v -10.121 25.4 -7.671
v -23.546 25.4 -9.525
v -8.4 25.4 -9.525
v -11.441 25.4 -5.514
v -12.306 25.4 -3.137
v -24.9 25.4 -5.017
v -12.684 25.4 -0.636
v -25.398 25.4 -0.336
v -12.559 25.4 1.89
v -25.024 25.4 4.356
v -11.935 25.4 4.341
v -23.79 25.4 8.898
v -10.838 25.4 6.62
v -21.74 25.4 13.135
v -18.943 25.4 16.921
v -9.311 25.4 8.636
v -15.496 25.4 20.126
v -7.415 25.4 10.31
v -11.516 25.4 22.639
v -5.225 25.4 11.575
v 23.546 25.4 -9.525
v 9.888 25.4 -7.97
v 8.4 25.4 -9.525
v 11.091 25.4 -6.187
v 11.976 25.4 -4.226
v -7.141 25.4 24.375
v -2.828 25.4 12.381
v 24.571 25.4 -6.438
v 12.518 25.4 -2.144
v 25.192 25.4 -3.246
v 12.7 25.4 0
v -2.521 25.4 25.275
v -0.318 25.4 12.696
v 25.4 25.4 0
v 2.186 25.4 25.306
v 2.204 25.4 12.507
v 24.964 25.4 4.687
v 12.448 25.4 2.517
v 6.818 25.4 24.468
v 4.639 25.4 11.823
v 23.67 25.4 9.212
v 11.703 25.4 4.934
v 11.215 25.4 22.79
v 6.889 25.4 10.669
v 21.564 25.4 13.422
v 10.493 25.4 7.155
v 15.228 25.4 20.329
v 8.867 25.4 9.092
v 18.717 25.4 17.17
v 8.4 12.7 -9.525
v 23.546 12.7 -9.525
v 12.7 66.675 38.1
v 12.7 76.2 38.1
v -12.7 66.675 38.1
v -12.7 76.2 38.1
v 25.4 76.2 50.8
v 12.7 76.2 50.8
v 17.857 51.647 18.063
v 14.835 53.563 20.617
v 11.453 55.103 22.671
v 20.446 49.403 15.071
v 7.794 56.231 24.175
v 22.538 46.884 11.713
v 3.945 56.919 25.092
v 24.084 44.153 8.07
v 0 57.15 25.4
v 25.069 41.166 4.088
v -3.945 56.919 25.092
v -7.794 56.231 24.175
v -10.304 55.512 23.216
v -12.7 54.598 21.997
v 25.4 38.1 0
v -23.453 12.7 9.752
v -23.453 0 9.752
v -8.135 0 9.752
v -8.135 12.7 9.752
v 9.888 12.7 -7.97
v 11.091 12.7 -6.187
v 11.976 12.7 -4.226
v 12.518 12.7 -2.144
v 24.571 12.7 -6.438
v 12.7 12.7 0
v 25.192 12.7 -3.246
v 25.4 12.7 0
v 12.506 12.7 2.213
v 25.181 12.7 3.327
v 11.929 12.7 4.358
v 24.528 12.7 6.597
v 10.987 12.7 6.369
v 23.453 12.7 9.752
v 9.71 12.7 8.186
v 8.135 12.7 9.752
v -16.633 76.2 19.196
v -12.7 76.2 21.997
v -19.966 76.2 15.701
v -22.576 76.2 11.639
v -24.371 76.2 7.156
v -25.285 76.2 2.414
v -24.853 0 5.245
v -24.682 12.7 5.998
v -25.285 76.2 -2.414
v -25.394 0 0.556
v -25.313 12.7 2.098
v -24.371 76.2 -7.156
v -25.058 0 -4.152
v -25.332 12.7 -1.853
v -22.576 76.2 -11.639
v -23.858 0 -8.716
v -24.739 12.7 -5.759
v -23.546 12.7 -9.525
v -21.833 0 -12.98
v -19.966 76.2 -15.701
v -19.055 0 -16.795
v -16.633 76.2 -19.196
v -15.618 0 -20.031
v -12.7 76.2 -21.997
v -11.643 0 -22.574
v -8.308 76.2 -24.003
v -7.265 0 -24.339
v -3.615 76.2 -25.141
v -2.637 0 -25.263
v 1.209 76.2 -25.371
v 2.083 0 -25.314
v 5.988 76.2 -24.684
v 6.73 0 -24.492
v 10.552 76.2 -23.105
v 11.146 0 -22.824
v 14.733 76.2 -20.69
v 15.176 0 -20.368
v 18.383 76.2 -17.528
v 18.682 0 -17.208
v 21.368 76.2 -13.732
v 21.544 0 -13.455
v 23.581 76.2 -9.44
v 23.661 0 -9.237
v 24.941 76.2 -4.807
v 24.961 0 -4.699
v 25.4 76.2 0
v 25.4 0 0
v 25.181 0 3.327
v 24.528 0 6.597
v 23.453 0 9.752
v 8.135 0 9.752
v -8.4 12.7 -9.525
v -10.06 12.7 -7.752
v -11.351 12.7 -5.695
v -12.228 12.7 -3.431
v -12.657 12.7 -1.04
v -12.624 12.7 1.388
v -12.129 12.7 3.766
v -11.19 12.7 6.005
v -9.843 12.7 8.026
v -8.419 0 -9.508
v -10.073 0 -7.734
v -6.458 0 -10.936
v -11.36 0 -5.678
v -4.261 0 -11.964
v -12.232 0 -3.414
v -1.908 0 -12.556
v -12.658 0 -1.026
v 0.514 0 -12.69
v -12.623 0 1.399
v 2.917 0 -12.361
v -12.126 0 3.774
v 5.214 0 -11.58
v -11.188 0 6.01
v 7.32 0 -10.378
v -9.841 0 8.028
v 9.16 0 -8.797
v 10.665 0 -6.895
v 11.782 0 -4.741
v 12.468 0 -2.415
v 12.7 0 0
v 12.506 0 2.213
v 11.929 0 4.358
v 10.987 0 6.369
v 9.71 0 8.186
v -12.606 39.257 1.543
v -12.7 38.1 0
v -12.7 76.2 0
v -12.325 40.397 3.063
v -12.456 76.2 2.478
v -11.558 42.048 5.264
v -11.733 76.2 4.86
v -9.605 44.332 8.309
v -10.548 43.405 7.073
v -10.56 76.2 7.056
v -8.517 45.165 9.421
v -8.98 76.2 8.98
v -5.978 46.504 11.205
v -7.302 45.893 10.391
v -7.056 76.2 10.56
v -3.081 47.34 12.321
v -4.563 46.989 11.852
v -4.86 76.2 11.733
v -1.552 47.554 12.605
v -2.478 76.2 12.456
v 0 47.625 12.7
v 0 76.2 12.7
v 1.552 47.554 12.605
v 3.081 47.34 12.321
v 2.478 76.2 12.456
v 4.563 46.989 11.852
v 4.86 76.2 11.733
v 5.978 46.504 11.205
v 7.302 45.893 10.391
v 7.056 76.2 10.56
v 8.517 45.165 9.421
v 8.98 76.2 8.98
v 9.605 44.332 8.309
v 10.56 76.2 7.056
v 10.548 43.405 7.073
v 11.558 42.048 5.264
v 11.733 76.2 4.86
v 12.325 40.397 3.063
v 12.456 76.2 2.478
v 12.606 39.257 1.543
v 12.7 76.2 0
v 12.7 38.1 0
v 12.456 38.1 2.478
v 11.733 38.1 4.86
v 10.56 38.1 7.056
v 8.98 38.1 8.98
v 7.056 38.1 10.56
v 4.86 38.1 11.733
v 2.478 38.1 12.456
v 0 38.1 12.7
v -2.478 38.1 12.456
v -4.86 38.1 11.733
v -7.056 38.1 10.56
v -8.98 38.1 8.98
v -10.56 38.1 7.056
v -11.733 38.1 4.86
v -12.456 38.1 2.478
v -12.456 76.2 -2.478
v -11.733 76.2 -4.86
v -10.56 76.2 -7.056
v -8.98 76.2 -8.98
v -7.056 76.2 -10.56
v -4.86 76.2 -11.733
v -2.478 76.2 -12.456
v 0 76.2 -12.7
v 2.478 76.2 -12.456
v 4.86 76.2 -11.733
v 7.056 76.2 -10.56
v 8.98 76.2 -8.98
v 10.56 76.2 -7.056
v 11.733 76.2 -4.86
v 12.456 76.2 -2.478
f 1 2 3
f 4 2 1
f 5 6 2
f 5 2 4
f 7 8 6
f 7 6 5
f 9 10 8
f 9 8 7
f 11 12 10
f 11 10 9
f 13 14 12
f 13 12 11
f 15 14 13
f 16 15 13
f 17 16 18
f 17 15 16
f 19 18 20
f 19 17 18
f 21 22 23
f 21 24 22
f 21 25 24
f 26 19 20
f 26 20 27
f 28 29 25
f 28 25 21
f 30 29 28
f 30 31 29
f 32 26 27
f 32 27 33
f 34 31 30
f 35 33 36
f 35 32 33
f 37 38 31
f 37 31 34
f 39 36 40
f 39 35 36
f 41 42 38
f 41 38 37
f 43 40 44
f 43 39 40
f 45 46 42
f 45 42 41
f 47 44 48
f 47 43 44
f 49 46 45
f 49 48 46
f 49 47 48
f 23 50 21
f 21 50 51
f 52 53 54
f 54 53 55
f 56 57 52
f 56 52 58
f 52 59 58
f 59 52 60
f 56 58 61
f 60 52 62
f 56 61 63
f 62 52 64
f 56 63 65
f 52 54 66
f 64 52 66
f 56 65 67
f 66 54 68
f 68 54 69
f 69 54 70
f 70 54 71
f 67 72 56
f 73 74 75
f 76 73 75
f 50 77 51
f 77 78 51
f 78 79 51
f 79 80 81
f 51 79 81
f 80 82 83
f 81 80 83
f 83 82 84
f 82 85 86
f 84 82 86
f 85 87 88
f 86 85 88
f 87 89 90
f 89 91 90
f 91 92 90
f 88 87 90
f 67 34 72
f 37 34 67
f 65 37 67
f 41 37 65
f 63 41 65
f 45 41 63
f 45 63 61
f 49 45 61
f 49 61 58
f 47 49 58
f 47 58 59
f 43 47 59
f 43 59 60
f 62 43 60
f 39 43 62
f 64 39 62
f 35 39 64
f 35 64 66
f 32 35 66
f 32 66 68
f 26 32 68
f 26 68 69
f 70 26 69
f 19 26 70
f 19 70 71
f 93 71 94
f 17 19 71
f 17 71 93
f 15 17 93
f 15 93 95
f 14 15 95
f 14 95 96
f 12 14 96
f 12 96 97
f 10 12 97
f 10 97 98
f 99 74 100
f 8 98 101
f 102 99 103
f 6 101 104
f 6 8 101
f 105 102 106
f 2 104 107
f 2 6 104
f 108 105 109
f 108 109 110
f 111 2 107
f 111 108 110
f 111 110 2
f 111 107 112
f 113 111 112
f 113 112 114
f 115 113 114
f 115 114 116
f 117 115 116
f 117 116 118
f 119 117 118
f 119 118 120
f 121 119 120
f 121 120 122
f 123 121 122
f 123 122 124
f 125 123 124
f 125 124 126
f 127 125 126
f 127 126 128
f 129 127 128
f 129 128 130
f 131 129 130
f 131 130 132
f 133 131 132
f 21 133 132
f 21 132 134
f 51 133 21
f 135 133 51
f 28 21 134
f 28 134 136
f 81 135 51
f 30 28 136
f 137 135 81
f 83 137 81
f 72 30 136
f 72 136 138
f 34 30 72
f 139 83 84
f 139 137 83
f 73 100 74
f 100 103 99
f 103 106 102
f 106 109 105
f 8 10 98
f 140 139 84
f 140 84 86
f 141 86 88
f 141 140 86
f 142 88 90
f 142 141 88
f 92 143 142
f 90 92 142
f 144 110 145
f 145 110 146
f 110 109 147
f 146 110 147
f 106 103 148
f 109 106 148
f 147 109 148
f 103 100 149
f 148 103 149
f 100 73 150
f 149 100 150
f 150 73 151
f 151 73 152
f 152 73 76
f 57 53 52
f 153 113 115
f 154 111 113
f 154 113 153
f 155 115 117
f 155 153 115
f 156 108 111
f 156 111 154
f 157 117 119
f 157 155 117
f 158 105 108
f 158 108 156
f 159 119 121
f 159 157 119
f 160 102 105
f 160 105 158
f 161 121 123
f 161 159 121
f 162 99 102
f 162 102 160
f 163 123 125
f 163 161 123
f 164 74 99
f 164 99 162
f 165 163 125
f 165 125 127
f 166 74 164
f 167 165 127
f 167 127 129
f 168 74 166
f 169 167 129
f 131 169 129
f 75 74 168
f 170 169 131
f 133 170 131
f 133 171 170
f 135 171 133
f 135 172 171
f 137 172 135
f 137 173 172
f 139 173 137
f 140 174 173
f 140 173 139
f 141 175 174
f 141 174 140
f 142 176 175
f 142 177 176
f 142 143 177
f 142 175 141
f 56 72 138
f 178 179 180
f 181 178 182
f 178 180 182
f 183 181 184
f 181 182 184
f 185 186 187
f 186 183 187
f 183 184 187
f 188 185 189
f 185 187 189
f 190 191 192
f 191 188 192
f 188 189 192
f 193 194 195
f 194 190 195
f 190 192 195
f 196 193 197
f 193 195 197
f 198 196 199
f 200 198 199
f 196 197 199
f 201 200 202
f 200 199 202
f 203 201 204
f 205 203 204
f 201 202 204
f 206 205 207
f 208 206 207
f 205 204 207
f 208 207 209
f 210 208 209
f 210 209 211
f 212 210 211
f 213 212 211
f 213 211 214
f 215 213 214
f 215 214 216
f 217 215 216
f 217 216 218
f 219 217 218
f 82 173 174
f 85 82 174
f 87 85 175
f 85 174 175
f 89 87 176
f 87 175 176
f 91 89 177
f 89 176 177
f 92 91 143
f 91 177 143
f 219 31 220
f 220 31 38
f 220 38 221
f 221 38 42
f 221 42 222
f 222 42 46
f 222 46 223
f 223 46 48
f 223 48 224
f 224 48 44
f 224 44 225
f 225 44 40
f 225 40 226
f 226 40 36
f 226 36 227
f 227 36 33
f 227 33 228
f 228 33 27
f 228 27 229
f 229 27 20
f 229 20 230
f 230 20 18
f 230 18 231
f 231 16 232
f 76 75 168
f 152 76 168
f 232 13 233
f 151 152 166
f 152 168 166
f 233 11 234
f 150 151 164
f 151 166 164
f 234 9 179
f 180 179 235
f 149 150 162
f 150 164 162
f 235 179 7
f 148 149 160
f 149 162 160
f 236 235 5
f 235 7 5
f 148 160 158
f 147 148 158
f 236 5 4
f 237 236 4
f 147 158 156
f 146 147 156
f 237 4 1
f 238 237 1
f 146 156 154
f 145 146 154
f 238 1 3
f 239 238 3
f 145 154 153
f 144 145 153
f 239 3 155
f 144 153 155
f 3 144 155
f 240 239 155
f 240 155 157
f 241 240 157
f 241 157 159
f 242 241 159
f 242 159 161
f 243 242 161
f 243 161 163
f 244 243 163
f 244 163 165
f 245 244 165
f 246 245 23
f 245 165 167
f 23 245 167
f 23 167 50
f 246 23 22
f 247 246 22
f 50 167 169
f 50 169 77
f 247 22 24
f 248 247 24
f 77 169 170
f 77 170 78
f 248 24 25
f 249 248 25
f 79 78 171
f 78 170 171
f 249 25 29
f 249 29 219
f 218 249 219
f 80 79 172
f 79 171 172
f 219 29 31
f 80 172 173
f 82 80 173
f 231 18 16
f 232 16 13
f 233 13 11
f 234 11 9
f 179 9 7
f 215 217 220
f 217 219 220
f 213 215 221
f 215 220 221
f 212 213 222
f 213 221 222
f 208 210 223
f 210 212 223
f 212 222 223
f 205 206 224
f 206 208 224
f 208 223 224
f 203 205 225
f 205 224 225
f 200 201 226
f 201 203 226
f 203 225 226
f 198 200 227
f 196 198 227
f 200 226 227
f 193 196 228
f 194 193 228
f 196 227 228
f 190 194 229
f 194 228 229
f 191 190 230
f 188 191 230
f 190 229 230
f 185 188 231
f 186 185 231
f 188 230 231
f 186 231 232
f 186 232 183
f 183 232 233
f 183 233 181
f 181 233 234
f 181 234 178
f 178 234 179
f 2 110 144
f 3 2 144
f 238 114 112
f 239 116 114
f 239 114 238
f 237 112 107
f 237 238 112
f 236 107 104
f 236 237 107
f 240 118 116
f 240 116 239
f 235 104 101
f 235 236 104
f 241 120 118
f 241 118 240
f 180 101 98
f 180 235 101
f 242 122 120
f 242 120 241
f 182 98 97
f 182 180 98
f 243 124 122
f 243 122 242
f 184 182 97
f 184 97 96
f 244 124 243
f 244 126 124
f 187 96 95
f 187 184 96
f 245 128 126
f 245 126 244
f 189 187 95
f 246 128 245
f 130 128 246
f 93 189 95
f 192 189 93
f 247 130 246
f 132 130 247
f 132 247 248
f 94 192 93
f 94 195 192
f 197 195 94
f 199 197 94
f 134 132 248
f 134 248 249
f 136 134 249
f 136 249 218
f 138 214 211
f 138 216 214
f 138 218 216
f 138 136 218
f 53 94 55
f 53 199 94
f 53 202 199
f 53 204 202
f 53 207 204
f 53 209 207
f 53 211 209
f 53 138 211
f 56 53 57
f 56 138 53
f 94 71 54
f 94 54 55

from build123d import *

# Parameters (mm, degrees)
F0_R          = 25.4
F0_R_2        = 12.7
F1_DEPTH      = 76.2
F3_DEPTH      = 12.7
F5_START      = -12.7
F5_DEPTH      = 12.7
F7_DEPTH      = 25.4
F7_DEPTH_BACK = 12.7
F9_DEPTH      = 38.1
F10_W         = 25.4
F10_H         = 12.7
F11_DEPTH     = 25.4


with BuildPart() as f1:
    # F0 (on Front) → F1 (new body)
    with BuildSketch(Plane.XZ):
        Circle(F0_R)
        Circle(F0_R_2, mode=Mode.SUBTRACT)
    extrude(amount=-F1_DEPTH)

    # F2 (on face) → F3 (cut)
    with BuildSketch(Plane.XZ):
        with BuildLine():
            Line((8.1350766981, 9.7524626181), (23.4531335408, 9.7524626181))
            ThreePointArc((23.4531335408, 9.7524626181), (0, 25.4), (-23.4531335408, 9.7524626181))
            Line((-23.4531335408, 9.7524626181), (-8.1350766981, 9.7524626181))
            ThreePointArc((-8.1350766981, 9.7524626181), (0, 12.7), (8.1350766981, 9.7524626181))
        make_face()
    extrude(amount=-F3_DEPTH, mode=Mode.SUBTRACT)

    # F4 (on face) → F5 (cut)
    with BuildSketch(Plane.XZ.offset(F5_START)):
        with BuildLine():
            Line((23.5464301965, -9.525), (38.1, -9.525))
            Line((38.1, -9.525), (38.1, 25.4))
            Line((38.1, 25.4), (-38.1, 25.4))
            Line((-38.1, 25.4), (-38.1, -9.525))
            Line((-38.1, -9.525), (-23.5464301965, -9.525))
            ThreePointArc((-23.5464301965, -9.525), (-25.39970254, 0.1229263078), (-23.4531335408, 9.7524626181))
            Line((-23.4531335408, 9.7524626181), (-8.1350766981, 9.7524626181))
            ThreePointArc((-8.1350766981, 9.7524626181), (-12.698798549, 0.1746866087), (-8.4002604126, -9.525))
            Line((-8.4002604126, -9.525), (8.4002604126, -9.525))
            ThreePointArc((8.4002604126, -9.525), (11.5752604126, -5.2252604126), (12.7, 0))
            ThreePointArc((12.7, 0), (11.5022926859, 5.3839820735), (8.1350766981, 9.7524626181))
            Line((8.1350766981, 9.7524626181), (23.4531335408, 9.7524626181))
            ThreePointArc((23.4531335408, 9.7524626181), (24.908528579, 4.9724444724), (25.4, 0))
            ThreePointArc((25.4, 0), (24.9323016085, -4.8518384664), (23.5464301965, -9.525))
        make_face()
        with BuildLine():
            ThreePointArc((-23.4531335408, 9.7524626181), (-25.39970254, 0.1229263078), (-23.5464301965, -9.525))
            Line((-23.5464301965, -9.525), (-8.4002604126, -9.525))
            ThreePointArc((-8.4002604126, -9.525), (-12.698798549, 0.1746866087), (-8.1350766981, 9.7524626181))
            Line((-8.1350766981, 9.7524626181), (-23.4531335408, 9.7524626181))
        make_face()
        with BuildLine():
            Line((8.4002604126, -9.525), (23.5464301965, -9.525))
            ThreePointArc((23.5464301965, -9.525), (24.9323016085, -4.8518384664), (25.4, 0))
            ThreePointArc((25.4, 0), (24.908528579, 4.9724444724), (23.4531335408, 9.7524626181))
            Line((23.4531335408, 9.7524626181), (8.1350766981, 9.7524626181))
            ThreePointArc((8.1350766981, 9.7524626181), (11.5022926859, 5.3839820735), (12.7, 0))
            ThreePointArc((12.7, 0), (11.5752604126, -5.2252604126), (8.4002604126, -9.525))
        make_face()
    extrude(amount=-F5_DEPTH, mode=Mode.SUBTRACT)

    # F6 (on Right) → F7 (join, two sides)
    with BuildSketch(Plane.YZ) as f7_sk:
        Polygon((38.1, 0), (76.2, 0), (76.2, 50.8), align=None)
    extrude(amount=F7_DEPTH)
    extrude(f7_sk.sketch, amount=-F7_DEPTH_BACK)

    # F8 (on face) → F9 (cut)
    with BuildSketch(Plane(origin=(0, 76.2, 0), x_dir=(-1, 0, 0), z_dir=(0, 1, 0))):
        with BuildLine():
            Line((-12.7, 0), (12.7, 0))
            ThreePointArc((12.7, 0), (0, 12.7), (-12.7, 0))
        make_face()
    extrude(amount=-F9_DEPTH, mode=Mode.SUBTRACT)

    # F10 (on face) → F11 (cut)
    with BuildSketch(Plane(origin=(0, 76.2, 0), x_dir=(-1, 0, 0), z_dir=(0, 1, 0))):
        with Locations((0, 44.45)):
            Rectangle(F10_W, F10_H)
    extrude(amount=-F11_DEPTH, mode=Mode.SUBTRACT)


solid = f1.part
